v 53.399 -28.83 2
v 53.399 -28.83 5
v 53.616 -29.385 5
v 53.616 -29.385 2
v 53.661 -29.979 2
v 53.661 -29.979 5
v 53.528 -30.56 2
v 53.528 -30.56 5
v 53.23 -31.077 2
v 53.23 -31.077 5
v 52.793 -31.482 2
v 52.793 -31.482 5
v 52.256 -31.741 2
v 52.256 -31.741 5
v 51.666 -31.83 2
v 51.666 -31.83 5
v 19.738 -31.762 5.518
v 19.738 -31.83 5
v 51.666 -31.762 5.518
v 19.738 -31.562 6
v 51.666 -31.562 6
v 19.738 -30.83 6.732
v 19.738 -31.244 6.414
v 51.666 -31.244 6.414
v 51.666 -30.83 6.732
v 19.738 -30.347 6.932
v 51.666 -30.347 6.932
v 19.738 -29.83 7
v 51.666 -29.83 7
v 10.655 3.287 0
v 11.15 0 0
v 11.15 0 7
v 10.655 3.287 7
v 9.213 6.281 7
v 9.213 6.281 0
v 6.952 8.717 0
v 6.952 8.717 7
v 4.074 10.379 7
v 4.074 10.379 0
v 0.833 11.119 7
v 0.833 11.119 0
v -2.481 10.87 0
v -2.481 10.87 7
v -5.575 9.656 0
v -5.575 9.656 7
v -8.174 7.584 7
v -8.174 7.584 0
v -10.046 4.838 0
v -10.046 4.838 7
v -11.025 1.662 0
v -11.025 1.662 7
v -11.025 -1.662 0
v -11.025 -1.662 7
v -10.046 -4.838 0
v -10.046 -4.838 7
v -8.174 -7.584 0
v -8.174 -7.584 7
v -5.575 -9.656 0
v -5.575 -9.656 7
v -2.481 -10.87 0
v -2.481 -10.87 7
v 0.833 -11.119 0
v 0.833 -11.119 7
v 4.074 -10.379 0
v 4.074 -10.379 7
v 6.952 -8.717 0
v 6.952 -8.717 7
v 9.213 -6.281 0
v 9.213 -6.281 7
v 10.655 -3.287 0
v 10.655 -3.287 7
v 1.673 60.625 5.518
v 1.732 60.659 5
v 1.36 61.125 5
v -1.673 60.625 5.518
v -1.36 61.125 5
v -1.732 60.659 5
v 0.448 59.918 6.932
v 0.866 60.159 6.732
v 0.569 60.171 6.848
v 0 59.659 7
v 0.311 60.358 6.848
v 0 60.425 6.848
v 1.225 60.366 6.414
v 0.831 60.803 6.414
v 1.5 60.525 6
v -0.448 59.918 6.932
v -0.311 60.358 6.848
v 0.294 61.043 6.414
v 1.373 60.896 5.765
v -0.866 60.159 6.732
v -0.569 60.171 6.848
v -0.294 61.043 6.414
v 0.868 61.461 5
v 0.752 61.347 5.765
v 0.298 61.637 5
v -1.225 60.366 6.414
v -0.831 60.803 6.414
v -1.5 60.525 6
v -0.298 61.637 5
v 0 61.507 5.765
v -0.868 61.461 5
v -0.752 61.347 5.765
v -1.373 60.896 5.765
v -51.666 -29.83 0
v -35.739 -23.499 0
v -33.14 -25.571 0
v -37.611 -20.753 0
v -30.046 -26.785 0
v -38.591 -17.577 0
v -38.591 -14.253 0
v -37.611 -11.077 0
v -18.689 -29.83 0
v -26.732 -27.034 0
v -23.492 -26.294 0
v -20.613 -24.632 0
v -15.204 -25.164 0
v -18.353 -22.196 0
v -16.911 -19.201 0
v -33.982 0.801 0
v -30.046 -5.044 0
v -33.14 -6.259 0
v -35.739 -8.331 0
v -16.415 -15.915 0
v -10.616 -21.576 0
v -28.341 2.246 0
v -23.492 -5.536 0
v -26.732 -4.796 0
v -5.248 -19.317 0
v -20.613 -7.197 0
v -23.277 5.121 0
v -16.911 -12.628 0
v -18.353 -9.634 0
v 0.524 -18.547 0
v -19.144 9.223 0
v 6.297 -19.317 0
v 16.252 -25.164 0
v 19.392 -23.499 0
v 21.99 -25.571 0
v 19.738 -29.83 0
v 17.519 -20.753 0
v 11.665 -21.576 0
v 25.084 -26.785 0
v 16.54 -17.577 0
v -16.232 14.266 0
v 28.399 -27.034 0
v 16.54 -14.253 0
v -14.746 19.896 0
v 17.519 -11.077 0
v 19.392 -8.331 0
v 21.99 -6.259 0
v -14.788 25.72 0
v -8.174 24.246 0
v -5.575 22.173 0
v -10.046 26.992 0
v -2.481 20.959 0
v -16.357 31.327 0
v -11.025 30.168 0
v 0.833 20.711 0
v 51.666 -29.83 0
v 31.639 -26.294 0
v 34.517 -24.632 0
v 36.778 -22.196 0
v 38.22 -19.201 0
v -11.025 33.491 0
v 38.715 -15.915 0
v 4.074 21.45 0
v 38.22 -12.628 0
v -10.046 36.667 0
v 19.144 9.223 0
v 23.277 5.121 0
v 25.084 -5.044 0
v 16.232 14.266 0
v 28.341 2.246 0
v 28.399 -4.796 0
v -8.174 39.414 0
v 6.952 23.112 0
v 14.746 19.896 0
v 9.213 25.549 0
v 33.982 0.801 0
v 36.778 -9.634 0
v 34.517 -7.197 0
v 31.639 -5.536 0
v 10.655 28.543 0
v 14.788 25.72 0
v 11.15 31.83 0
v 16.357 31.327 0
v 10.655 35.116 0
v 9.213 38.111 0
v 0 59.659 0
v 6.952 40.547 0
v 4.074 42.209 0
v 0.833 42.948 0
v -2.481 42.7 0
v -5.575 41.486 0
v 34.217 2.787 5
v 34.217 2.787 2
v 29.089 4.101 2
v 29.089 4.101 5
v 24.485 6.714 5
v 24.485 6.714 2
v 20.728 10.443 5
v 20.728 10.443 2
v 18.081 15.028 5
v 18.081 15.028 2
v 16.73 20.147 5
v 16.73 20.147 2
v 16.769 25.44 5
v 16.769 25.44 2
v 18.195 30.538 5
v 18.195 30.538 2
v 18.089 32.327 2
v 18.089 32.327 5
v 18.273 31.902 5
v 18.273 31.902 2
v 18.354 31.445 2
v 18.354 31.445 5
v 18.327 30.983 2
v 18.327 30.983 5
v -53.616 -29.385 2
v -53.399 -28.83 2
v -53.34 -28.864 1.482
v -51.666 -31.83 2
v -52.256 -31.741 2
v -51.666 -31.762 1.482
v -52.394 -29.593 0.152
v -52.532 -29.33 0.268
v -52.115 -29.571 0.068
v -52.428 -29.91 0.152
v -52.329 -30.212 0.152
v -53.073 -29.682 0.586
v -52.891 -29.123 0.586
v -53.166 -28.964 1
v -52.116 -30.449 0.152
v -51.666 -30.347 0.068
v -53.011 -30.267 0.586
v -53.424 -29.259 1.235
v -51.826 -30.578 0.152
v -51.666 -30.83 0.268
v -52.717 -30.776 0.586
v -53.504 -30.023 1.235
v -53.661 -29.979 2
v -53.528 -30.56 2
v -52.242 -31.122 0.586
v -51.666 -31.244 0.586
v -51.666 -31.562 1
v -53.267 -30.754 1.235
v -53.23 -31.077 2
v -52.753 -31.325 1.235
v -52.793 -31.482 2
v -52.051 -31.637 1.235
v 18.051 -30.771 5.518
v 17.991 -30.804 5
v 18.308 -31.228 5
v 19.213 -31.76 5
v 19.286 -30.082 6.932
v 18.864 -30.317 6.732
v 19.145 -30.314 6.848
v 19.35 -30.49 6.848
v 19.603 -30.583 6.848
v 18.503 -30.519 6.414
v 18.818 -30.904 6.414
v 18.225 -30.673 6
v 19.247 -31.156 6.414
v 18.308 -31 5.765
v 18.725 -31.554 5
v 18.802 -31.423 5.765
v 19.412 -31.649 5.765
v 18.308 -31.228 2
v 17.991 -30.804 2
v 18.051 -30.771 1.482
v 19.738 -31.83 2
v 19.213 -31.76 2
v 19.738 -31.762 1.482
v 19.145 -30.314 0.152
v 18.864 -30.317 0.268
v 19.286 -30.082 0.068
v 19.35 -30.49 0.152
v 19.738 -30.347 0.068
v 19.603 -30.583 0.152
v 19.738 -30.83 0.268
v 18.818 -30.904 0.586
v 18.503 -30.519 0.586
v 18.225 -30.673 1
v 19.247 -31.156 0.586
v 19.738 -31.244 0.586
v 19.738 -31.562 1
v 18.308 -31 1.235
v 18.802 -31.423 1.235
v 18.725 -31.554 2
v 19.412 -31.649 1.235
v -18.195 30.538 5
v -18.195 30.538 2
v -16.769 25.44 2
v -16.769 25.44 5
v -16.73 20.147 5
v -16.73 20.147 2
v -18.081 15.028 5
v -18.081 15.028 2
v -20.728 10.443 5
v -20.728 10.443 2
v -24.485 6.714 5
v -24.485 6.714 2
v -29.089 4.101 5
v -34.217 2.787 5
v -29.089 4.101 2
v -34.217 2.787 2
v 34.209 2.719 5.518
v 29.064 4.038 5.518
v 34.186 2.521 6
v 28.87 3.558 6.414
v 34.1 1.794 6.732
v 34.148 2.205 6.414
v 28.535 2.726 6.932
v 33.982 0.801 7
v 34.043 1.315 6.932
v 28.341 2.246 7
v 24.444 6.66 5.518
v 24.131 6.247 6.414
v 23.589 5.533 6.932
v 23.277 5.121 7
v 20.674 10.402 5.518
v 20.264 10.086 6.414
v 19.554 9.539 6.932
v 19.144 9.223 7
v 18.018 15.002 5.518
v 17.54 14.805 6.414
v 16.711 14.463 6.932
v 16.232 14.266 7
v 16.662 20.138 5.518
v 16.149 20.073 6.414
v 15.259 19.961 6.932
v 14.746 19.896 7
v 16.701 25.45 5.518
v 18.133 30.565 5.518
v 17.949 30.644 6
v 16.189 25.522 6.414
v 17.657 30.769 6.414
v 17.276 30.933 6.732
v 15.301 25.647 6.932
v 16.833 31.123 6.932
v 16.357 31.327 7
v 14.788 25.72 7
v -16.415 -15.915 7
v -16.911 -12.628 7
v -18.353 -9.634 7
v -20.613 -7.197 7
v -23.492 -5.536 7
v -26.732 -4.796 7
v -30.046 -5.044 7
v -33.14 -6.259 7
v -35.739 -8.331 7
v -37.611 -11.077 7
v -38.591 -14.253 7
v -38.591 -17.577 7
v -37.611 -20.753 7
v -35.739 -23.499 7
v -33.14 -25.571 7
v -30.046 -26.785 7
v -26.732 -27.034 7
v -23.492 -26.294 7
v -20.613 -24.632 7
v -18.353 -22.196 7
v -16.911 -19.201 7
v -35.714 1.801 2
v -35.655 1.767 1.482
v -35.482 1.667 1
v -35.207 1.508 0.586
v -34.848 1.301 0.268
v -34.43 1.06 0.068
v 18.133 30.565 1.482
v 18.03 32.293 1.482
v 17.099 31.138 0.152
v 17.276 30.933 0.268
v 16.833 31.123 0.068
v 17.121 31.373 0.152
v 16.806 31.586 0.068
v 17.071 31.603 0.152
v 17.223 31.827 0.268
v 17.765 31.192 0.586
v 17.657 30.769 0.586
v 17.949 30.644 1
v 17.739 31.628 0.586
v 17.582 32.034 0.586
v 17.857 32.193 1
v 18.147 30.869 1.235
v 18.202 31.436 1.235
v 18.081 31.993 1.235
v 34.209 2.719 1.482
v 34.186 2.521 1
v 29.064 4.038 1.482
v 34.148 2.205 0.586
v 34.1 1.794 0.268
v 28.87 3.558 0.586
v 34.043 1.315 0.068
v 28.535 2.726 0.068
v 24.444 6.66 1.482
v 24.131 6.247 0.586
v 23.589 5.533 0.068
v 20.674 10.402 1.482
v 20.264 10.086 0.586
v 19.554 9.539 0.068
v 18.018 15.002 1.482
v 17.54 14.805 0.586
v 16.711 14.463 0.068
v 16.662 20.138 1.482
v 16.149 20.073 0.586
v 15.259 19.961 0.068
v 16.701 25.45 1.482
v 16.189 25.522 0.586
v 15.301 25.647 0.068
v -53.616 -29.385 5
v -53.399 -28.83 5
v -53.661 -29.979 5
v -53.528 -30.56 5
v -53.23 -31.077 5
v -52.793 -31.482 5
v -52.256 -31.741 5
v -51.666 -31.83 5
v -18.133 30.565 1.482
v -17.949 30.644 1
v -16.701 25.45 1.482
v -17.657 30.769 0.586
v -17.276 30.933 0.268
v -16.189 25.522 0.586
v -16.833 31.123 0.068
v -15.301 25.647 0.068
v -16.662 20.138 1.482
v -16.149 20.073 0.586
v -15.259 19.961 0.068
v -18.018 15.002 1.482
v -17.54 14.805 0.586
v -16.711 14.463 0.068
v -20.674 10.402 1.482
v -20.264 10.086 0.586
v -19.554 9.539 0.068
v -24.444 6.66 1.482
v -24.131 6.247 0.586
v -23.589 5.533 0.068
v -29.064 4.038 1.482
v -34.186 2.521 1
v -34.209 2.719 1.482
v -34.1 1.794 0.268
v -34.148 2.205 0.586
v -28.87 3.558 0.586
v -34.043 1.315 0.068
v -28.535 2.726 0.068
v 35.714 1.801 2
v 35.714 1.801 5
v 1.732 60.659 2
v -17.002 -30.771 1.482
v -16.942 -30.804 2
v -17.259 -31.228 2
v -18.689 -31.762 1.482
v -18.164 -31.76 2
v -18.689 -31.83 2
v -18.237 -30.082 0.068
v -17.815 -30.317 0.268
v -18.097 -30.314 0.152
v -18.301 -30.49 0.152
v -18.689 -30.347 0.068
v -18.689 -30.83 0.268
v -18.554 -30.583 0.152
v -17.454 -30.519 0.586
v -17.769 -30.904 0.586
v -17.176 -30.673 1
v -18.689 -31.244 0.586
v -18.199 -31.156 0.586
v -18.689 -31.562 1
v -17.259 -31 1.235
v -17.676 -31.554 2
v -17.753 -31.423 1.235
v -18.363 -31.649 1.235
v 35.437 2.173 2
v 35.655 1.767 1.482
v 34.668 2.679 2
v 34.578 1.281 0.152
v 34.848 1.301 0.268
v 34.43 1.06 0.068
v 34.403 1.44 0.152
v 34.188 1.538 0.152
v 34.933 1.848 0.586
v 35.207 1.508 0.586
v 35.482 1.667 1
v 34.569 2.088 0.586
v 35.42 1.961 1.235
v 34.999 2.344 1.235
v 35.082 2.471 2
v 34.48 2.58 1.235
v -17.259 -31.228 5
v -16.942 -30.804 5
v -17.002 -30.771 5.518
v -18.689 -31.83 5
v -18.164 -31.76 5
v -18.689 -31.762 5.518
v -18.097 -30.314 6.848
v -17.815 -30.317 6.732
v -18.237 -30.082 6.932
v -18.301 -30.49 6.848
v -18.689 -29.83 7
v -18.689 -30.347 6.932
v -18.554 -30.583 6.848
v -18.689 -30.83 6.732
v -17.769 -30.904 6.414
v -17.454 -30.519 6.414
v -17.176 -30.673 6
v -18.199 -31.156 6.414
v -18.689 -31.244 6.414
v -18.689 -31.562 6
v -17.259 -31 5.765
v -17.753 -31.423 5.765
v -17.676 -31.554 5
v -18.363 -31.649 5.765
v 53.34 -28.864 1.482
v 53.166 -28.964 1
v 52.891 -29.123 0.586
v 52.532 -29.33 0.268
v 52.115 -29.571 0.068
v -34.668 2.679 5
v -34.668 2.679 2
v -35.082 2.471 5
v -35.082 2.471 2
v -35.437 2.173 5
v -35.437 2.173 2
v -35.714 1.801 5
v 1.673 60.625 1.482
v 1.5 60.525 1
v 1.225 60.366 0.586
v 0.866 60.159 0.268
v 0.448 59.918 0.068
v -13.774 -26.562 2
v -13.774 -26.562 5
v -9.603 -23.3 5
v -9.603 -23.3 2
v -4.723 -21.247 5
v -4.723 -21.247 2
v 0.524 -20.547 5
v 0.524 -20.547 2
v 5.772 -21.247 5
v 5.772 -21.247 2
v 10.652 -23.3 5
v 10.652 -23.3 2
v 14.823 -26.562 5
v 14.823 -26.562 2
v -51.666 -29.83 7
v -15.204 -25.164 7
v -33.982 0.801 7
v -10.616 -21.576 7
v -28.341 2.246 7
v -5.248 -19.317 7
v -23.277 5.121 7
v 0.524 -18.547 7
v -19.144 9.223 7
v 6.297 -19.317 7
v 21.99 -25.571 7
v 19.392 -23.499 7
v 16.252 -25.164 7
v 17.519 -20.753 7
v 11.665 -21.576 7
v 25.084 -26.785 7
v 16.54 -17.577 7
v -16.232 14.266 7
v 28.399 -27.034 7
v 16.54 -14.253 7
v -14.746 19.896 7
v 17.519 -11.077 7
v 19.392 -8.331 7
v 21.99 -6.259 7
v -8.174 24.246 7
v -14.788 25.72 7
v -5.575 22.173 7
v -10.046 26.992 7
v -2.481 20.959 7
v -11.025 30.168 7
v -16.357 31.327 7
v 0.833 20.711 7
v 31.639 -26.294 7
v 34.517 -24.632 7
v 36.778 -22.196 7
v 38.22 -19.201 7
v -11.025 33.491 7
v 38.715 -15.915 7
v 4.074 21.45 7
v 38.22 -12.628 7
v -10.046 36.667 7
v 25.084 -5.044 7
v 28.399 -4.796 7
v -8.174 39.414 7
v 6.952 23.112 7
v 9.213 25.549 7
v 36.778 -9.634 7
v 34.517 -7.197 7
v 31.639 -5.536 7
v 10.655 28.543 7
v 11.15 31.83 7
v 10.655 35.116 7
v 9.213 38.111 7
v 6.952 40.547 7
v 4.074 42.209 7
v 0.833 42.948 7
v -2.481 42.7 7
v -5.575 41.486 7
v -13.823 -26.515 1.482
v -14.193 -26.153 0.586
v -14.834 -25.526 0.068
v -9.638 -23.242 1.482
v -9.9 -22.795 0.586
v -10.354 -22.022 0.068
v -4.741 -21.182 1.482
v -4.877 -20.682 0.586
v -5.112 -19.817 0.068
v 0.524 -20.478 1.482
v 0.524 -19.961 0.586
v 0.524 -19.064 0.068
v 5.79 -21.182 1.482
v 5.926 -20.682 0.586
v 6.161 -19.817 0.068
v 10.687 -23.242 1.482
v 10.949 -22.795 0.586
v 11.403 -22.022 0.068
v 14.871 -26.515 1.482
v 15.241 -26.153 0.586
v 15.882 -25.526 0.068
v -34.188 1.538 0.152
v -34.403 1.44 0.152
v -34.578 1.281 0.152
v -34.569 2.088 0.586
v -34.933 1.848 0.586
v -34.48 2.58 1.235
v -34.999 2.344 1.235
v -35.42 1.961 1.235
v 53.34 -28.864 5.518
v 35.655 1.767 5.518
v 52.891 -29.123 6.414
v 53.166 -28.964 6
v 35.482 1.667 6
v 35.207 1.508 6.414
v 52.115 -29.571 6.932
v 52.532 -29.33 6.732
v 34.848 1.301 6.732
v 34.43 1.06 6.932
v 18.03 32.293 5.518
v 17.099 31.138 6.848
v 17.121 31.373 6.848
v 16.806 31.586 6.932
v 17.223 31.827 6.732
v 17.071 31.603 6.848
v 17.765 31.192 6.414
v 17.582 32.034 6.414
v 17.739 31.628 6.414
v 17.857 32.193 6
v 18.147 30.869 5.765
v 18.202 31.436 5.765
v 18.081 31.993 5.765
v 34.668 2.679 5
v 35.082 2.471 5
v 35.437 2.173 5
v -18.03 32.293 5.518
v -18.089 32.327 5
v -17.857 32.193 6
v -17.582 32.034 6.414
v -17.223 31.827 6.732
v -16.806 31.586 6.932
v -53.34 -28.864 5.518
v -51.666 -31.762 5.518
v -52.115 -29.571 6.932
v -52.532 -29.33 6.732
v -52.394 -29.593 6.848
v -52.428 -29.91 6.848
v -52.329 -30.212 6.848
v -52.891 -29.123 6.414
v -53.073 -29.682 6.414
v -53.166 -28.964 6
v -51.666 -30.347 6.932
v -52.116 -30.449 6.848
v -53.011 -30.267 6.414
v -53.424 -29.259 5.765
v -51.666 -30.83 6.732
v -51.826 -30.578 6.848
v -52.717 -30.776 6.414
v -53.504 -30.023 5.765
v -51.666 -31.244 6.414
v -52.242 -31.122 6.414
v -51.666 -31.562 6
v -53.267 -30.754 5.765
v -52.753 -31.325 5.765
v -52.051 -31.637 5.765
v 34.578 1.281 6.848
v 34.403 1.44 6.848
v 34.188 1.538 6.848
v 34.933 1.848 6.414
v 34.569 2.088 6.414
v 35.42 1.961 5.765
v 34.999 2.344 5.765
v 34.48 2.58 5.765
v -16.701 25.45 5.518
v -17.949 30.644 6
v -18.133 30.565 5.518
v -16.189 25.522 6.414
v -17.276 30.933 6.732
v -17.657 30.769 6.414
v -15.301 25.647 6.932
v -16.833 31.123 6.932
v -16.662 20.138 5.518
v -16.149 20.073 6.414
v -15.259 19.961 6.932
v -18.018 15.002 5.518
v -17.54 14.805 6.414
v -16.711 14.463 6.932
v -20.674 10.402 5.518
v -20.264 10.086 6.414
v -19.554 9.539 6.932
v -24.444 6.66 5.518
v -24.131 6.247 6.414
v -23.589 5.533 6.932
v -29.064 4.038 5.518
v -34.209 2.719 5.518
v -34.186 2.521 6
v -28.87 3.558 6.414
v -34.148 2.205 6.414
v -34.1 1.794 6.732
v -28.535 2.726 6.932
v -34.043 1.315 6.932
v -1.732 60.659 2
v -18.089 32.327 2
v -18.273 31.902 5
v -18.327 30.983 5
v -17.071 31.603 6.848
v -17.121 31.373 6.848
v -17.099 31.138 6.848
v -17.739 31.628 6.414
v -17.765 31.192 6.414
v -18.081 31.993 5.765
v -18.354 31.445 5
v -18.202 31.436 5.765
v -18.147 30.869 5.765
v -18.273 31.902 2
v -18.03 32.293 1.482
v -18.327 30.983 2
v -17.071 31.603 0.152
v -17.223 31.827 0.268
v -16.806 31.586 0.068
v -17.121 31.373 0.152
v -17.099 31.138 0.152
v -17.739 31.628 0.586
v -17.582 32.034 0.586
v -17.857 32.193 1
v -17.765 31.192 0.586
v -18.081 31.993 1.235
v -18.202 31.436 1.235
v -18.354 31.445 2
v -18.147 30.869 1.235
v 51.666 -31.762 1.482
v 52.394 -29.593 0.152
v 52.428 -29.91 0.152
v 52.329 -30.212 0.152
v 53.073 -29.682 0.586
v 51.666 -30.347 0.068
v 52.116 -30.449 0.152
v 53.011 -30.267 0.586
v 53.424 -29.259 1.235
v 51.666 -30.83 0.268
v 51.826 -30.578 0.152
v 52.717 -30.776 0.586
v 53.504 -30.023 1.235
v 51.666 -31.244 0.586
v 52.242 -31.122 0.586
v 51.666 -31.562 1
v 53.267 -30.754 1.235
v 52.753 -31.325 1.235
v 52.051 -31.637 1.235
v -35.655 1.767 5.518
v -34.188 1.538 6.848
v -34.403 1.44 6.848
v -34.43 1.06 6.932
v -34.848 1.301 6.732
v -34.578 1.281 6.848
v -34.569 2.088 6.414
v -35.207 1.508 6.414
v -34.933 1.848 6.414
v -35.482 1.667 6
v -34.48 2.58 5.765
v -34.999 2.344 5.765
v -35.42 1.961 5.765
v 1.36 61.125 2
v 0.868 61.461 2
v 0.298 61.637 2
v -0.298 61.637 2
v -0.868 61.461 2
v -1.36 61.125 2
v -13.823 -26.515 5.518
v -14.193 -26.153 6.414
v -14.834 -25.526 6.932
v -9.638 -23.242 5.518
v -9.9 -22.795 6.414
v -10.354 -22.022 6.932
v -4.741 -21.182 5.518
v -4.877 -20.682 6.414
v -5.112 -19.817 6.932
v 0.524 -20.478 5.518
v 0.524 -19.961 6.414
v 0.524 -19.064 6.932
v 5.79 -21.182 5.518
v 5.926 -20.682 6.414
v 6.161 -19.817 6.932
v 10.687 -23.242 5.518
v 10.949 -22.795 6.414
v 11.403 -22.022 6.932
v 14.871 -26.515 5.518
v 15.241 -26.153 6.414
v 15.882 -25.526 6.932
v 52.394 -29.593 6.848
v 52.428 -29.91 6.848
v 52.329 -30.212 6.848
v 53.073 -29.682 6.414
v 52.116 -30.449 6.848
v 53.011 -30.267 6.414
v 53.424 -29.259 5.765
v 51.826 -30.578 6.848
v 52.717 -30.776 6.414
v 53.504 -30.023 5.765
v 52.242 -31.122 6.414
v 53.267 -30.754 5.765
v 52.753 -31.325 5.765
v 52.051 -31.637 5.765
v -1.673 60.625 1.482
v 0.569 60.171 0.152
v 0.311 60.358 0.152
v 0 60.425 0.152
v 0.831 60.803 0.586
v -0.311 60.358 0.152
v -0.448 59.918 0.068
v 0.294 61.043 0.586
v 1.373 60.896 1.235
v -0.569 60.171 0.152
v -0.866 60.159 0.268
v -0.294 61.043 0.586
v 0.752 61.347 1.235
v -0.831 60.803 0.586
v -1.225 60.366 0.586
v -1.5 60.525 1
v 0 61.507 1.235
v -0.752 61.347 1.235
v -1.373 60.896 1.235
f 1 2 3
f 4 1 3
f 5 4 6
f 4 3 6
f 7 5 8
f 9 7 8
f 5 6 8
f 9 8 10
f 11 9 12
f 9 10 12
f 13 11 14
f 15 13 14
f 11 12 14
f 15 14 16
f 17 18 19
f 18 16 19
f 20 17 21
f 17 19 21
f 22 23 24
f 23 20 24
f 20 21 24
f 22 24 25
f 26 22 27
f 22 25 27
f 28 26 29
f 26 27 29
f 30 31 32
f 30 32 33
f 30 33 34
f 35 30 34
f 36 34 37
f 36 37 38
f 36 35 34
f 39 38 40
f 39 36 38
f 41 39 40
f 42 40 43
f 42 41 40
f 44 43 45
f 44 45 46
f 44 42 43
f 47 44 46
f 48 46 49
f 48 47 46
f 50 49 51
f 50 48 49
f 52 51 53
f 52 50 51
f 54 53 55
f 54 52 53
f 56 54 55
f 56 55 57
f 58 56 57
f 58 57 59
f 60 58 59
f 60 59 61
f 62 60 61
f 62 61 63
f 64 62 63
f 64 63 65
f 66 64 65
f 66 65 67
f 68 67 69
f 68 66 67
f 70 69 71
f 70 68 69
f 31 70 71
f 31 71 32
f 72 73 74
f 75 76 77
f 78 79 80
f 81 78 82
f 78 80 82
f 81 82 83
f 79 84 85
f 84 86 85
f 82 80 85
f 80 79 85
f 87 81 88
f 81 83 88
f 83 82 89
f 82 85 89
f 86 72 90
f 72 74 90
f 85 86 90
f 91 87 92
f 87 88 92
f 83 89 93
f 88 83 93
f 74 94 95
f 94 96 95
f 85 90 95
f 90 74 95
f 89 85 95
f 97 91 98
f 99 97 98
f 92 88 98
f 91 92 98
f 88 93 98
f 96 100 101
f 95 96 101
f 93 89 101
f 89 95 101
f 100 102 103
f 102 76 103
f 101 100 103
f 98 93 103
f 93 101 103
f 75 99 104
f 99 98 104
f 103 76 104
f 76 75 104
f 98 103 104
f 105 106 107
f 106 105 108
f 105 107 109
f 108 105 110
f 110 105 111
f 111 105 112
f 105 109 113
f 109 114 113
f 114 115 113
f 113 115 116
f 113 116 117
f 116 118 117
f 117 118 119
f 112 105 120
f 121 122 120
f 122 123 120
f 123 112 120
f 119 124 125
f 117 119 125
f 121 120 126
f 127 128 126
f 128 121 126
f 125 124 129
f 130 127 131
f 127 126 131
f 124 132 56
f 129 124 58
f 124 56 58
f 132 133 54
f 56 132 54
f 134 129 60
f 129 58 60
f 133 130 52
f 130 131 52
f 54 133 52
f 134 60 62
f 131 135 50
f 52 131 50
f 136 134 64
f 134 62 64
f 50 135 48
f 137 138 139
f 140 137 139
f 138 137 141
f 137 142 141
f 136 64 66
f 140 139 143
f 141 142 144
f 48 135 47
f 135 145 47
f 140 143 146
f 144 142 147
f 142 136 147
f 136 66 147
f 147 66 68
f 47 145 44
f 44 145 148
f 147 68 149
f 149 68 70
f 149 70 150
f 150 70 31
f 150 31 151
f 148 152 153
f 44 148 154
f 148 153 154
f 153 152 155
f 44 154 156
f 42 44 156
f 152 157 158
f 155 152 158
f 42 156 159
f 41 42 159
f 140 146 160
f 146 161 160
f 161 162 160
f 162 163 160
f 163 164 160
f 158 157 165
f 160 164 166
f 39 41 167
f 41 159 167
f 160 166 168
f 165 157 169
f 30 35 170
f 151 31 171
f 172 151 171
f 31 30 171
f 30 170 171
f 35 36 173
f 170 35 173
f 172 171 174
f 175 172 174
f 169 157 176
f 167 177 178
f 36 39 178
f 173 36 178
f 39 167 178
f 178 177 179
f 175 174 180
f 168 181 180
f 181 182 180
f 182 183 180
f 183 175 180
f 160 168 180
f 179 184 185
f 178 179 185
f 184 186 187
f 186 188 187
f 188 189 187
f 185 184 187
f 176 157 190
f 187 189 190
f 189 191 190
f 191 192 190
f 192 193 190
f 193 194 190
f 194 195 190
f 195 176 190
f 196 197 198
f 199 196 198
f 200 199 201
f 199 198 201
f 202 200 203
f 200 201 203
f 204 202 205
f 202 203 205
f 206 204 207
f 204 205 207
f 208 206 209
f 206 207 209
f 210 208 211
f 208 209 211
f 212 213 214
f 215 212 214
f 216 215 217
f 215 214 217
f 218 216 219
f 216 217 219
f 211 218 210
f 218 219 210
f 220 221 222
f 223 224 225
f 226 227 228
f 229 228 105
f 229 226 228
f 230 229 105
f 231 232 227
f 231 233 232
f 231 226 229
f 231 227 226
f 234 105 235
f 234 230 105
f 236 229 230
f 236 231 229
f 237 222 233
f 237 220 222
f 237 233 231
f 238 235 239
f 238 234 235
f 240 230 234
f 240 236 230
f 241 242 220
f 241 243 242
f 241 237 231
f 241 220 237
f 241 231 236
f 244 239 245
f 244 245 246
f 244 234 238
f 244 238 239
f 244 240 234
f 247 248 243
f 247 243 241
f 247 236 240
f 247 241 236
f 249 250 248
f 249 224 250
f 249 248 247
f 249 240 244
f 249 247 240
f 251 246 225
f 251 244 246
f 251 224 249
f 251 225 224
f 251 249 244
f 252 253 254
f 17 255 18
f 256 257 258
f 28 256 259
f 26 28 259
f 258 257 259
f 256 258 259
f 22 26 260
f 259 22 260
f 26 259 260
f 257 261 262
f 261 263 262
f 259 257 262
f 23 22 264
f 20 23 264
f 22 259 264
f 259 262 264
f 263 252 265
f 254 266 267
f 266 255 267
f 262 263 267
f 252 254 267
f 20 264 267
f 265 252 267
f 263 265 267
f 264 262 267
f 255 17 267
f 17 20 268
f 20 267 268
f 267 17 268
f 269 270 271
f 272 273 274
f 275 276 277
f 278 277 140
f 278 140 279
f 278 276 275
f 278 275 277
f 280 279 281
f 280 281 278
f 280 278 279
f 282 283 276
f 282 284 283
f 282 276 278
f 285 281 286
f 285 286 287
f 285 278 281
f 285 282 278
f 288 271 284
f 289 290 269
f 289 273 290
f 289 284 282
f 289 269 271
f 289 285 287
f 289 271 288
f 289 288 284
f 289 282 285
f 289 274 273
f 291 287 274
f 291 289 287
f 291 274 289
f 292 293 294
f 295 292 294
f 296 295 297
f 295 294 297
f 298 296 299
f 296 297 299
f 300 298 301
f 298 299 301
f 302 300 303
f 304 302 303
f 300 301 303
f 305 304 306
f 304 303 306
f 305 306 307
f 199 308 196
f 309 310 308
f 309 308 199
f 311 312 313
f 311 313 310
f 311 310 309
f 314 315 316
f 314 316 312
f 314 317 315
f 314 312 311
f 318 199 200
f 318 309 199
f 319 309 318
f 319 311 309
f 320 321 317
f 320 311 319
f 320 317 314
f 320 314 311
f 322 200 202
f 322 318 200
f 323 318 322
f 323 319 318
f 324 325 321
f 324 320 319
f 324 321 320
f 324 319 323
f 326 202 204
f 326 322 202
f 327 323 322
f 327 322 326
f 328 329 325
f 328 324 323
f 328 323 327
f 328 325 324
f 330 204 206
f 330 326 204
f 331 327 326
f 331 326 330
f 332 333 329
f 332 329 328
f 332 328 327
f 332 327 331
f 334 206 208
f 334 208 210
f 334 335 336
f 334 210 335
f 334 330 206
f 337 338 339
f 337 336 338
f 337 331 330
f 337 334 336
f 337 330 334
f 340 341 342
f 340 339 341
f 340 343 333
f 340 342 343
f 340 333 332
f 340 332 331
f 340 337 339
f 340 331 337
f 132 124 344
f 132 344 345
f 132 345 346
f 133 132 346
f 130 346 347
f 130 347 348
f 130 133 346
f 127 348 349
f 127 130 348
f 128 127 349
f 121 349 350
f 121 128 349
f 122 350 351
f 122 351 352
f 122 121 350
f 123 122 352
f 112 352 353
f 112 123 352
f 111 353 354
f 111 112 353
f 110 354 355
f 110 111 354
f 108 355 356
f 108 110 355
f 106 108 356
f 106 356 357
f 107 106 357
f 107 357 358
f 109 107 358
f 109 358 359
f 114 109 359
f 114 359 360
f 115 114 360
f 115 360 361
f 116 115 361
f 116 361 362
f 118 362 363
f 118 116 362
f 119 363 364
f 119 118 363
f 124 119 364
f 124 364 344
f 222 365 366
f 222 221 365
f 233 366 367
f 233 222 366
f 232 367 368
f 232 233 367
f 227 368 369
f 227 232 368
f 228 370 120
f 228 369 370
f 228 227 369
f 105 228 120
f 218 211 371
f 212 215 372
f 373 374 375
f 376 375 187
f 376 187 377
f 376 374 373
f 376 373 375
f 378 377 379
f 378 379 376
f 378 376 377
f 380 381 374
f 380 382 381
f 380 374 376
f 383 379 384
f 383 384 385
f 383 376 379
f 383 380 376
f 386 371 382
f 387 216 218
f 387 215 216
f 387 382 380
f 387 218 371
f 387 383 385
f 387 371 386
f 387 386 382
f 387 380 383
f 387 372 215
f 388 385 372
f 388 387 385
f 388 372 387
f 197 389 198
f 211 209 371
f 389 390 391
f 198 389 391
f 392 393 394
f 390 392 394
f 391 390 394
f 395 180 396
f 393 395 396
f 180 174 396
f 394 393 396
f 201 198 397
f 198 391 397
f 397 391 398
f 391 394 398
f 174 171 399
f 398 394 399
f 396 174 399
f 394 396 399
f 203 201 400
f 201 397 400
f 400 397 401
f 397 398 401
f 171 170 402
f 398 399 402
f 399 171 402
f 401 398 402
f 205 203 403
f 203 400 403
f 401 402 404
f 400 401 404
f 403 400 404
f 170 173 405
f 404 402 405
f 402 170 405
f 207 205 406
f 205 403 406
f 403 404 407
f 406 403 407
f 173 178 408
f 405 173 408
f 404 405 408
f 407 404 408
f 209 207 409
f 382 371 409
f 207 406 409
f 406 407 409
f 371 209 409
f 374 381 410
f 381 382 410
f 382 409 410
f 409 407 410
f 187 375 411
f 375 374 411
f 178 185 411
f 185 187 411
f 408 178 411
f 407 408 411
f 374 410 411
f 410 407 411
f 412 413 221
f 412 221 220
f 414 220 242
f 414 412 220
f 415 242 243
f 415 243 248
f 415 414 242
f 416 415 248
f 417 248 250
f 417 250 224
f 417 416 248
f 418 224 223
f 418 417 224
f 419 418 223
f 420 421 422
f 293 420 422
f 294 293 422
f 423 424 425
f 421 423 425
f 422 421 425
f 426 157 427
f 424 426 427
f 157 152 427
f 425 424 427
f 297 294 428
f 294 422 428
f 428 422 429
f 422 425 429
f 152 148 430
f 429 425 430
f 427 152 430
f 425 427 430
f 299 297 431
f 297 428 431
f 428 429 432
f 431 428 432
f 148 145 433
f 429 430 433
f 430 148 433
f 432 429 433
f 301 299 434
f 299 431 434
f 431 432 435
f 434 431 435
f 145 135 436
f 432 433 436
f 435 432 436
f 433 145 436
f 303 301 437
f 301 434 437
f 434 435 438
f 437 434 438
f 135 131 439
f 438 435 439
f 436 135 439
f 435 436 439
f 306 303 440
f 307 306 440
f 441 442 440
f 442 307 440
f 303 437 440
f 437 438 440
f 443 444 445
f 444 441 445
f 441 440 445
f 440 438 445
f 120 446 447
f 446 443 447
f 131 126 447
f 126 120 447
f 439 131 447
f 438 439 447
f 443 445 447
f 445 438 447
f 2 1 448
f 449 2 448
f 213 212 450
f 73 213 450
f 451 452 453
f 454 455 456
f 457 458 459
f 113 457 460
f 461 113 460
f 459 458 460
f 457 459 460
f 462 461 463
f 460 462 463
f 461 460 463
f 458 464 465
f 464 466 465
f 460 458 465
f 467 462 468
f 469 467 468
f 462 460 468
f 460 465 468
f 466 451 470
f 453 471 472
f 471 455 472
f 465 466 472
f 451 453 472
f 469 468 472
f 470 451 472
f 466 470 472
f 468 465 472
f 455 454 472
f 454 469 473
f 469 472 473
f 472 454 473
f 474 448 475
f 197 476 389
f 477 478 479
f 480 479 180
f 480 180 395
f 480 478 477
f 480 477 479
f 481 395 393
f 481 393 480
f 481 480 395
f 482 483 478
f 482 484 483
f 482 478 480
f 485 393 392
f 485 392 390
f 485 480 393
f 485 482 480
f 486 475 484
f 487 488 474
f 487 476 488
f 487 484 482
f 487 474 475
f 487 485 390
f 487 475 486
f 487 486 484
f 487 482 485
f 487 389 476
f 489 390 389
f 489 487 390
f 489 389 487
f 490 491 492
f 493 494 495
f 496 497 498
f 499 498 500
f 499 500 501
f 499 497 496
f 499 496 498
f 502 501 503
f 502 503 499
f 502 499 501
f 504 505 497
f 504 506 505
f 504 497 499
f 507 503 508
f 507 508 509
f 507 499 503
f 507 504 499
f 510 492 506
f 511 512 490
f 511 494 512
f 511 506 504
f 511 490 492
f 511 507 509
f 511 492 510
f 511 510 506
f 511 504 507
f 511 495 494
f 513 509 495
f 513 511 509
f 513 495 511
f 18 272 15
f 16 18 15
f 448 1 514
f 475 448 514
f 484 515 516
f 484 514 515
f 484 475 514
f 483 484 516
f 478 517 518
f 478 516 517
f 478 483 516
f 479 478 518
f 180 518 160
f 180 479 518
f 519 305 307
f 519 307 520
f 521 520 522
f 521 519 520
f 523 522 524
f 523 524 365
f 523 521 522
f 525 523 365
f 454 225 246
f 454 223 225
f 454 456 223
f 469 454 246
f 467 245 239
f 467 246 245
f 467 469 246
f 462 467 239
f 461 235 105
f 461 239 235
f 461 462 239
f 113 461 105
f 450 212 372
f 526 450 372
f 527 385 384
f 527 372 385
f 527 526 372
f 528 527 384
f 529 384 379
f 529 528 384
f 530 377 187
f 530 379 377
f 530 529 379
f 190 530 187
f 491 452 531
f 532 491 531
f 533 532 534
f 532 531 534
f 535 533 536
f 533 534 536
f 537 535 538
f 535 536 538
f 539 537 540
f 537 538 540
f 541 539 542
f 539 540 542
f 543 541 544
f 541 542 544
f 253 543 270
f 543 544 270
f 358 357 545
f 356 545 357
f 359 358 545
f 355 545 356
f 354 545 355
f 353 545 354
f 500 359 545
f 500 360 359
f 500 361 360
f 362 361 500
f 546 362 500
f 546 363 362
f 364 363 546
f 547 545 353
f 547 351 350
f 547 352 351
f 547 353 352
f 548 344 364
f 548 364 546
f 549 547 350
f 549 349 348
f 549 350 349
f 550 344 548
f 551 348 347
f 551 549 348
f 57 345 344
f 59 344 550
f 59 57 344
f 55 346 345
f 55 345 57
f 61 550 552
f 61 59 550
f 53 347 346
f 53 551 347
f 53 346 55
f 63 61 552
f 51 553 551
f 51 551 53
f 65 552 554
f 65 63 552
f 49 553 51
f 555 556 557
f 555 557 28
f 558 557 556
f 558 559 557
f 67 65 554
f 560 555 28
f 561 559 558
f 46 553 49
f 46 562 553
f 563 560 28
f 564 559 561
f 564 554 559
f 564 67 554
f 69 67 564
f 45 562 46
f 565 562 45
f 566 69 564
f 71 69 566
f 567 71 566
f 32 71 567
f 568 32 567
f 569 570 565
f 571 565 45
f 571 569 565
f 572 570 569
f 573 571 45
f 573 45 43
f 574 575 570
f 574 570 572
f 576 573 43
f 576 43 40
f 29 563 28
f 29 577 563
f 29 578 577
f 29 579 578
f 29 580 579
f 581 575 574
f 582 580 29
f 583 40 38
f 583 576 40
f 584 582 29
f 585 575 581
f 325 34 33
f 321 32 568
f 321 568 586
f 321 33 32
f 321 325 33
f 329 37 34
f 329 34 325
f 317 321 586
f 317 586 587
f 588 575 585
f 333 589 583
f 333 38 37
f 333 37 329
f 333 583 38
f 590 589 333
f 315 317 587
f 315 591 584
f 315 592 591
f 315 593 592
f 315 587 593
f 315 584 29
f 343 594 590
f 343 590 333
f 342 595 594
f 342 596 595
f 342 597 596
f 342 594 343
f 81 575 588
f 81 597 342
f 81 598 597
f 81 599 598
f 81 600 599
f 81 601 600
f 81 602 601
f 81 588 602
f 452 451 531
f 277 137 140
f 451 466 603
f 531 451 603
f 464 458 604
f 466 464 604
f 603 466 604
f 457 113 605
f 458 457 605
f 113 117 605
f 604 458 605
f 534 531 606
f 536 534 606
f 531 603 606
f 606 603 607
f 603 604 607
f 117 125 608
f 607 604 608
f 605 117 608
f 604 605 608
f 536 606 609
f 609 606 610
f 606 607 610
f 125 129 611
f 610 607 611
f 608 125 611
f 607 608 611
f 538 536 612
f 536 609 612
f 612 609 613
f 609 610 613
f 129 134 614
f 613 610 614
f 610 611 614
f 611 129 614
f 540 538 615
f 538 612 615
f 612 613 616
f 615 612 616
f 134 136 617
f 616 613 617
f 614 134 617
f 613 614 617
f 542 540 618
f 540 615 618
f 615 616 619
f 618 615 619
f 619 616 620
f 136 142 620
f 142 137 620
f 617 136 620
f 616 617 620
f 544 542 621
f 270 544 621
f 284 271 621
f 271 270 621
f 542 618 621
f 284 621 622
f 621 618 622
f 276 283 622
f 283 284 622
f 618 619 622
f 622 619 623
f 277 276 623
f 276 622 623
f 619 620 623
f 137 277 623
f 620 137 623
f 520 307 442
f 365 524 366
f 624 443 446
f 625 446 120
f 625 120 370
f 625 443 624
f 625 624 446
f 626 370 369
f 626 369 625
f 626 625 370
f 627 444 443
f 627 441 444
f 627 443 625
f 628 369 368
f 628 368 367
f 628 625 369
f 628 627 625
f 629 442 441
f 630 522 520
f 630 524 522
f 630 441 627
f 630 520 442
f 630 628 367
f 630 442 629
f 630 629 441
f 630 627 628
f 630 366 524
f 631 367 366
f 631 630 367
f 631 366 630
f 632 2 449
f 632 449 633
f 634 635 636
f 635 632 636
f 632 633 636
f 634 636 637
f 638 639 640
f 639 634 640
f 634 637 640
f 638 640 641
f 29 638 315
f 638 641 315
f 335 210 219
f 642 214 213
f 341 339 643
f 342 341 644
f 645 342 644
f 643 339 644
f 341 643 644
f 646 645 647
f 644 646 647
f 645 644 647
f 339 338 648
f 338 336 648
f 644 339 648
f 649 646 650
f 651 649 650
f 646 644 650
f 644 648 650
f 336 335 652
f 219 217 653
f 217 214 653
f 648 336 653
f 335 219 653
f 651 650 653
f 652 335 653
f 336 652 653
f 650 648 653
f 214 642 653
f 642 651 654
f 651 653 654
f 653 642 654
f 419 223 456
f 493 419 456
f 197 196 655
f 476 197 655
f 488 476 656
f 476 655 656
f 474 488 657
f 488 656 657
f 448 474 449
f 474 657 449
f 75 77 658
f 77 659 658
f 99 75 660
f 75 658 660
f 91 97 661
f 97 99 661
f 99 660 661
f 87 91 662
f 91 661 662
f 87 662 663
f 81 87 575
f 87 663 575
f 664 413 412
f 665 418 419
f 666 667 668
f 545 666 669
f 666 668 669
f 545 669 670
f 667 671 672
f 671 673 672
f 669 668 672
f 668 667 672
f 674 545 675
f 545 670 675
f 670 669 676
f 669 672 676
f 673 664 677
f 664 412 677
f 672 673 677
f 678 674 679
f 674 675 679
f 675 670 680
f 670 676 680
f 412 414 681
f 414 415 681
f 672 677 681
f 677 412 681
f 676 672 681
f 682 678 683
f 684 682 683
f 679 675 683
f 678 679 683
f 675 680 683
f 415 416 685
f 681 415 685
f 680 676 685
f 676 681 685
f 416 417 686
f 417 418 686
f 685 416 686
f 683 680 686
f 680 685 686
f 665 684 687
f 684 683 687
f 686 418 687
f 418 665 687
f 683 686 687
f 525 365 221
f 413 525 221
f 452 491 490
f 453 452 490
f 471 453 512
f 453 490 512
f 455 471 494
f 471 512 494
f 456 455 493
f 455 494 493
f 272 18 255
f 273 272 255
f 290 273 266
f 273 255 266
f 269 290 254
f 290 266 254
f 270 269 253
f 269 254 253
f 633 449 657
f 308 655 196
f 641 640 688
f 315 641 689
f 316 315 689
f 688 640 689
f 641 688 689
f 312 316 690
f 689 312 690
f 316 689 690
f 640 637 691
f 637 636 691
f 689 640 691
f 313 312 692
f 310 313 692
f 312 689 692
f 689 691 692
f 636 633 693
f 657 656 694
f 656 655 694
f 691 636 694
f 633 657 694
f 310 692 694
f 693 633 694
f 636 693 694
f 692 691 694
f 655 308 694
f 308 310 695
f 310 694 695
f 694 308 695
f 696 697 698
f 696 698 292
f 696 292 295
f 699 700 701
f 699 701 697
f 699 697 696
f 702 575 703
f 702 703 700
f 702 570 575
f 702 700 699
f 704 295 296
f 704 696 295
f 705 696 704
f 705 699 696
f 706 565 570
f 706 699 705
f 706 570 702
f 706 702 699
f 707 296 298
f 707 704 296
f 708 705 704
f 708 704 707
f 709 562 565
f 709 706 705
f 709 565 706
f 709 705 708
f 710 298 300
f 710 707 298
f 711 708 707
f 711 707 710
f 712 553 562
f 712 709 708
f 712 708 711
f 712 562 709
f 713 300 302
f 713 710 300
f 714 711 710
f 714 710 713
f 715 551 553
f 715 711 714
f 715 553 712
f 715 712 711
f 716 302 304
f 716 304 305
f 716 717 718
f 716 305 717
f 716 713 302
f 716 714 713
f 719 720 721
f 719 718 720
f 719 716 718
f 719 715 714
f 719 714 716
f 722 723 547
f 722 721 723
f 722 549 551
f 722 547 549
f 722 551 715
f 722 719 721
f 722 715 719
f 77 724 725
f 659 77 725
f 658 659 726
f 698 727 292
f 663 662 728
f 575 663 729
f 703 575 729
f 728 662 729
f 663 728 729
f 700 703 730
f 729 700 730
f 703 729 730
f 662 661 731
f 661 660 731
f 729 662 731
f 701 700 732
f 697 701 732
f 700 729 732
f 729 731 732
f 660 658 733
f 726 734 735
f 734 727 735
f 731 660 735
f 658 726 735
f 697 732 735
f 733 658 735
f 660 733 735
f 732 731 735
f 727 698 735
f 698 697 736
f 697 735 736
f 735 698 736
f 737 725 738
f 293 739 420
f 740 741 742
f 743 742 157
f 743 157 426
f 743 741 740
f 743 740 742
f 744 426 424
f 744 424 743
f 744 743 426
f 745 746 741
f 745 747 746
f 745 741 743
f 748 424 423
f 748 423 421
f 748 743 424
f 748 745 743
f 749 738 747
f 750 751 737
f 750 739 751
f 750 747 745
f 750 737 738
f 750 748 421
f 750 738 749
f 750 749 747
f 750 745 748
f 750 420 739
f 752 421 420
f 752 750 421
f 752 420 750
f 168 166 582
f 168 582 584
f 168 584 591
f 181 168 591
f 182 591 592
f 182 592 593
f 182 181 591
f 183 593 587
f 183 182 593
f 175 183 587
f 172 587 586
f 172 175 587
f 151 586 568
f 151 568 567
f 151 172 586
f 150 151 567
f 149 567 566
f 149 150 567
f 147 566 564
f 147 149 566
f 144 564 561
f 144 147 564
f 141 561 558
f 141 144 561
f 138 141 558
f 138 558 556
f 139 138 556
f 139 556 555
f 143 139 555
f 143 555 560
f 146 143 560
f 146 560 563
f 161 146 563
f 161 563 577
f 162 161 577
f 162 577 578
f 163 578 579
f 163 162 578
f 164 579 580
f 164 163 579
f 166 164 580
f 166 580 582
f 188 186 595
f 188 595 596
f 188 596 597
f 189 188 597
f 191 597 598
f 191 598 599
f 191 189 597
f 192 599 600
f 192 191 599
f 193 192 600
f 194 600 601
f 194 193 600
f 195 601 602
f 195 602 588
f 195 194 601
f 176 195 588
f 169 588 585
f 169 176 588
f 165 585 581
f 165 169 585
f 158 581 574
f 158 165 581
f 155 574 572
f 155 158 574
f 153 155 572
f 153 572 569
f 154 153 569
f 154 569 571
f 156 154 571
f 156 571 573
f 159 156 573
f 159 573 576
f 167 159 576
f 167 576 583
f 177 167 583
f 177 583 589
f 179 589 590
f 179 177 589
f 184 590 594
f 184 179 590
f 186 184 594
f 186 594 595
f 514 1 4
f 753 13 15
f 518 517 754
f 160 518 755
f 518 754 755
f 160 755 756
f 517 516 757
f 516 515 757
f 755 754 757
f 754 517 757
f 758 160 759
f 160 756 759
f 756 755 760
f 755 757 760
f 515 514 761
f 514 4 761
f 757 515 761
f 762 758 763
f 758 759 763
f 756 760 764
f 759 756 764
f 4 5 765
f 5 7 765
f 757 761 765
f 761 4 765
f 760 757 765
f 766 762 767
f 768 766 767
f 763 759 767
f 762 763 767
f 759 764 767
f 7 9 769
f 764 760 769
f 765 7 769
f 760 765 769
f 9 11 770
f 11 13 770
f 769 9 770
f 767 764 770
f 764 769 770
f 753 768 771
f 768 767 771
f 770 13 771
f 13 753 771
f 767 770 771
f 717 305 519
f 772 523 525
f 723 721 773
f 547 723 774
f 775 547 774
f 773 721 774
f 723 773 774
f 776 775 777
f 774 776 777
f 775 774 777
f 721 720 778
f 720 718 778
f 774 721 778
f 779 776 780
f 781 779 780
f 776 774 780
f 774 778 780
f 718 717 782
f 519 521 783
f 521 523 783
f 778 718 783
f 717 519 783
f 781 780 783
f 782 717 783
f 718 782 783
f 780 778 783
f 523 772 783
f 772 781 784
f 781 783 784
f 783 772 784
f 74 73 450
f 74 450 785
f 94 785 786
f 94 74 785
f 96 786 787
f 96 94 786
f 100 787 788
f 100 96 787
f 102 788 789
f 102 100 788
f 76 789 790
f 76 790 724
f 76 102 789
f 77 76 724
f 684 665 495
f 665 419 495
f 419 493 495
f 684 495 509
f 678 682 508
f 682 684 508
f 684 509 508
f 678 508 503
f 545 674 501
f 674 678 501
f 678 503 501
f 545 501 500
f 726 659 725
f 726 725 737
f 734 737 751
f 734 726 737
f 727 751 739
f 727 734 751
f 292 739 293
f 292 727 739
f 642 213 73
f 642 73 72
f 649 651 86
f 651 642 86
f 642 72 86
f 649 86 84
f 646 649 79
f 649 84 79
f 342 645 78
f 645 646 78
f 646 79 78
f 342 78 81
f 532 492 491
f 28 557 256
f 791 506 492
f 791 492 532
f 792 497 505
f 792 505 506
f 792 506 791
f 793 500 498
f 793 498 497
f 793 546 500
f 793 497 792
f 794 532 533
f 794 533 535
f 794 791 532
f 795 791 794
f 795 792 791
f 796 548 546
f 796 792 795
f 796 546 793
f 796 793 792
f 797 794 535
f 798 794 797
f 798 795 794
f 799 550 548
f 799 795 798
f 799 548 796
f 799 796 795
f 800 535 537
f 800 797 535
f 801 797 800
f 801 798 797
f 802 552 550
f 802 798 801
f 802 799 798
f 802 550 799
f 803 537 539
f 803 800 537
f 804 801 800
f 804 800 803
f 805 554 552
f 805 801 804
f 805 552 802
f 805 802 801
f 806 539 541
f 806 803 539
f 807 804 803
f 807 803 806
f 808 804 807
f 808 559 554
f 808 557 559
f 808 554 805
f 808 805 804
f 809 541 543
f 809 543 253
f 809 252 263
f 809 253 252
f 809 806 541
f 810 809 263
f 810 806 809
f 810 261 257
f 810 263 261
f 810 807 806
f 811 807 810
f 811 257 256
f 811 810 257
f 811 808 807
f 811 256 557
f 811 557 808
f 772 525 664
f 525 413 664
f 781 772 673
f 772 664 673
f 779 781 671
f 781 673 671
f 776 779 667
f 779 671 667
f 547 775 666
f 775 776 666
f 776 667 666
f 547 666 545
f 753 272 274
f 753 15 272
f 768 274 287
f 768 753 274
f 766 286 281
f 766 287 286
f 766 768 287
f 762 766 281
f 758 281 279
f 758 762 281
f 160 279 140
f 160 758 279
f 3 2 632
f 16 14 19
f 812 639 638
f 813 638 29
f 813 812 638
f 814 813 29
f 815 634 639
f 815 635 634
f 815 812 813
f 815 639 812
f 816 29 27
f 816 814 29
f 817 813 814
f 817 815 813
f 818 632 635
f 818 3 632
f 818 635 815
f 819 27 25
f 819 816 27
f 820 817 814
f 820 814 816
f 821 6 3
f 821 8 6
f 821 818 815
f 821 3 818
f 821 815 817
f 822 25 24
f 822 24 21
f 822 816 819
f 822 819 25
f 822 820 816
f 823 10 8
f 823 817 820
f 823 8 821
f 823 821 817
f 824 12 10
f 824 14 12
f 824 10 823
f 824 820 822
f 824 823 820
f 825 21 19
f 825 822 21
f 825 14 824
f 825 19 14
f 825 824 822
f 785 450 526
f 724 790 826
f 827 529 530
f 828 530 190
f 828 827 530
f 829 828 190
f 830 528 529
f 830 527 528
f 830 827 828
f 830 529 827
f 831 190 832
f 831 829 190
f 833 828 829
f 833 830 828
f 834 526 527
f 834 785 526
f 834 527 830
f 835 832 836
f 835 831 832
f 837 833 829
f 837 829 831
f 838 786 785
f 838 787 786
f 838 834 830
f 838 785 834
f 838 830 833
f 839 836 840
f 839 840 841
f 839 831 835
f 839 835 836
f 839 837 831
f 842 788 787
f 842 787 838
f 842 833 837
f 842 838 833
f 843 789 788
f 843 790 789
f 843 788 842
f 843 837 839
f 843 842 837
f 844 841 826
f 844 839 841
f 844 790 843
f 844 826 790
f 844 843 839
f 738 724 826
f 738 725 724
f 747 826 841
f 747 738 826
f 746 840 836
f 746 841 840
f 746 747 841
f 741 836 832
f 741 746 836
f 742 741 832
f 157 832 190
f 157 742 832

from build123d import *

# Parameters (mm, degrees)
F0_R     = 11.15
F1_DEPTH = 7
F2_R     = 2


# Not quite as in the source:
# - a feature names something its author has since deleted; it is built from what else it names


with BuildPart() as f1:
    # F0 (on Top) → F1 (new body)
    with BuildSketch(Plane.XY):
        with BuildLine():
            Line((18.6057756776, 31.4331508418), (0, 63.6592996296))
            Line((0, 63.6592996296), (-18.6057756776, 31.4331508418))
            ThreePointArc((-18.6057756776, 31.4331508418), (-19.2524106529, 12.6478352194), (-35.1976537124, 2.6951750926))
            Line((-35.1976537124, 2.6951750926), (-55.1305706664, -31.8296498148))
            Line((-55.1305706664, -31.8296498148), (-17.4760334194, -31.8296498148))
            ThreePointArc((-17.4760334194, -31.8296498148), (0.5244189685, -20.546513576), (18.5248713564, -31.8296498148))
            Line((18.5248713564, -31.8296498148), (55.1305706664, -31.8296498148))
            Line((55.1305706664, -31.8296498148), (35.1976537124, 2.6951750926))
            ThreePointArc((35.1976537124, 2.6951750926), (19.2524106529, 12.6478352194), (18.6057756776, 31.4331508418))
        make_face()
        with Locations((-27.5652853332, -15.9148249074)):
            Circle(F0_R, mode=Mode.SUBTRACT)
        with Locations((27.5652853332, -15.9148249074)):
            Circle(F0_R, mode=Mode.SUBTRACT)
        Circle(F0_R, mode=Mode.SUBTRACT)
        with Locations((0, 31.8296498148)):
            Circle(F0_R, mode=Mode.SUBTRACT)
    extrude(amount=F1_DEPTH)

    # F2
    f2_edges = [f1.edges().sort_by_distance(p)[0] for p in [
        (55.130571, -31.82965, 3.5),
        (35.197654, 2.695175, 3.5),
        (45.164112, -14.567237, 0),
        (45.164112, -14.567237, 7),
        (18.605776, 31.433151, 3.5),
        (19.252411, 12.647835, 0),
        (19.252411, 12.647835, 7),
        (0, 63.6593, 3.5),
        (9.302888, 47.546225, 0),
        (9.302888, 47.546225, 7),
        (-18.605776, 31.433151, 3.5),
        (-9.302888, 47.546225, 0),
        (-9.302888, 47.546225, 7),
        (-35.197654, 2.695175, 3.5),
        (-19.252411, 12.647835, 0),
        (-19.252411, 12.647835, 7),
        (-55.130571, -31.82965, 3.5),
        (-45.164112, -14.567237, 0),
        (-45.164112, -14.567237, 7),
        (-17.476033, -31.82965, 3.5),
        (18.524871, -31.82965, 3.5),
        (0.524419, -20.546514, 0),
        (0.524419, -20.546514, 7),
        (-36.303302, -31.82965, 0),
        (-36.303302, -31.82965, 7),
        (36.827721, -31.82965, 0),
        (36.827721, -31.82965, 7),
    ]]
    fillet(f2_edges, radius=F2_R)


solid = f1.part
